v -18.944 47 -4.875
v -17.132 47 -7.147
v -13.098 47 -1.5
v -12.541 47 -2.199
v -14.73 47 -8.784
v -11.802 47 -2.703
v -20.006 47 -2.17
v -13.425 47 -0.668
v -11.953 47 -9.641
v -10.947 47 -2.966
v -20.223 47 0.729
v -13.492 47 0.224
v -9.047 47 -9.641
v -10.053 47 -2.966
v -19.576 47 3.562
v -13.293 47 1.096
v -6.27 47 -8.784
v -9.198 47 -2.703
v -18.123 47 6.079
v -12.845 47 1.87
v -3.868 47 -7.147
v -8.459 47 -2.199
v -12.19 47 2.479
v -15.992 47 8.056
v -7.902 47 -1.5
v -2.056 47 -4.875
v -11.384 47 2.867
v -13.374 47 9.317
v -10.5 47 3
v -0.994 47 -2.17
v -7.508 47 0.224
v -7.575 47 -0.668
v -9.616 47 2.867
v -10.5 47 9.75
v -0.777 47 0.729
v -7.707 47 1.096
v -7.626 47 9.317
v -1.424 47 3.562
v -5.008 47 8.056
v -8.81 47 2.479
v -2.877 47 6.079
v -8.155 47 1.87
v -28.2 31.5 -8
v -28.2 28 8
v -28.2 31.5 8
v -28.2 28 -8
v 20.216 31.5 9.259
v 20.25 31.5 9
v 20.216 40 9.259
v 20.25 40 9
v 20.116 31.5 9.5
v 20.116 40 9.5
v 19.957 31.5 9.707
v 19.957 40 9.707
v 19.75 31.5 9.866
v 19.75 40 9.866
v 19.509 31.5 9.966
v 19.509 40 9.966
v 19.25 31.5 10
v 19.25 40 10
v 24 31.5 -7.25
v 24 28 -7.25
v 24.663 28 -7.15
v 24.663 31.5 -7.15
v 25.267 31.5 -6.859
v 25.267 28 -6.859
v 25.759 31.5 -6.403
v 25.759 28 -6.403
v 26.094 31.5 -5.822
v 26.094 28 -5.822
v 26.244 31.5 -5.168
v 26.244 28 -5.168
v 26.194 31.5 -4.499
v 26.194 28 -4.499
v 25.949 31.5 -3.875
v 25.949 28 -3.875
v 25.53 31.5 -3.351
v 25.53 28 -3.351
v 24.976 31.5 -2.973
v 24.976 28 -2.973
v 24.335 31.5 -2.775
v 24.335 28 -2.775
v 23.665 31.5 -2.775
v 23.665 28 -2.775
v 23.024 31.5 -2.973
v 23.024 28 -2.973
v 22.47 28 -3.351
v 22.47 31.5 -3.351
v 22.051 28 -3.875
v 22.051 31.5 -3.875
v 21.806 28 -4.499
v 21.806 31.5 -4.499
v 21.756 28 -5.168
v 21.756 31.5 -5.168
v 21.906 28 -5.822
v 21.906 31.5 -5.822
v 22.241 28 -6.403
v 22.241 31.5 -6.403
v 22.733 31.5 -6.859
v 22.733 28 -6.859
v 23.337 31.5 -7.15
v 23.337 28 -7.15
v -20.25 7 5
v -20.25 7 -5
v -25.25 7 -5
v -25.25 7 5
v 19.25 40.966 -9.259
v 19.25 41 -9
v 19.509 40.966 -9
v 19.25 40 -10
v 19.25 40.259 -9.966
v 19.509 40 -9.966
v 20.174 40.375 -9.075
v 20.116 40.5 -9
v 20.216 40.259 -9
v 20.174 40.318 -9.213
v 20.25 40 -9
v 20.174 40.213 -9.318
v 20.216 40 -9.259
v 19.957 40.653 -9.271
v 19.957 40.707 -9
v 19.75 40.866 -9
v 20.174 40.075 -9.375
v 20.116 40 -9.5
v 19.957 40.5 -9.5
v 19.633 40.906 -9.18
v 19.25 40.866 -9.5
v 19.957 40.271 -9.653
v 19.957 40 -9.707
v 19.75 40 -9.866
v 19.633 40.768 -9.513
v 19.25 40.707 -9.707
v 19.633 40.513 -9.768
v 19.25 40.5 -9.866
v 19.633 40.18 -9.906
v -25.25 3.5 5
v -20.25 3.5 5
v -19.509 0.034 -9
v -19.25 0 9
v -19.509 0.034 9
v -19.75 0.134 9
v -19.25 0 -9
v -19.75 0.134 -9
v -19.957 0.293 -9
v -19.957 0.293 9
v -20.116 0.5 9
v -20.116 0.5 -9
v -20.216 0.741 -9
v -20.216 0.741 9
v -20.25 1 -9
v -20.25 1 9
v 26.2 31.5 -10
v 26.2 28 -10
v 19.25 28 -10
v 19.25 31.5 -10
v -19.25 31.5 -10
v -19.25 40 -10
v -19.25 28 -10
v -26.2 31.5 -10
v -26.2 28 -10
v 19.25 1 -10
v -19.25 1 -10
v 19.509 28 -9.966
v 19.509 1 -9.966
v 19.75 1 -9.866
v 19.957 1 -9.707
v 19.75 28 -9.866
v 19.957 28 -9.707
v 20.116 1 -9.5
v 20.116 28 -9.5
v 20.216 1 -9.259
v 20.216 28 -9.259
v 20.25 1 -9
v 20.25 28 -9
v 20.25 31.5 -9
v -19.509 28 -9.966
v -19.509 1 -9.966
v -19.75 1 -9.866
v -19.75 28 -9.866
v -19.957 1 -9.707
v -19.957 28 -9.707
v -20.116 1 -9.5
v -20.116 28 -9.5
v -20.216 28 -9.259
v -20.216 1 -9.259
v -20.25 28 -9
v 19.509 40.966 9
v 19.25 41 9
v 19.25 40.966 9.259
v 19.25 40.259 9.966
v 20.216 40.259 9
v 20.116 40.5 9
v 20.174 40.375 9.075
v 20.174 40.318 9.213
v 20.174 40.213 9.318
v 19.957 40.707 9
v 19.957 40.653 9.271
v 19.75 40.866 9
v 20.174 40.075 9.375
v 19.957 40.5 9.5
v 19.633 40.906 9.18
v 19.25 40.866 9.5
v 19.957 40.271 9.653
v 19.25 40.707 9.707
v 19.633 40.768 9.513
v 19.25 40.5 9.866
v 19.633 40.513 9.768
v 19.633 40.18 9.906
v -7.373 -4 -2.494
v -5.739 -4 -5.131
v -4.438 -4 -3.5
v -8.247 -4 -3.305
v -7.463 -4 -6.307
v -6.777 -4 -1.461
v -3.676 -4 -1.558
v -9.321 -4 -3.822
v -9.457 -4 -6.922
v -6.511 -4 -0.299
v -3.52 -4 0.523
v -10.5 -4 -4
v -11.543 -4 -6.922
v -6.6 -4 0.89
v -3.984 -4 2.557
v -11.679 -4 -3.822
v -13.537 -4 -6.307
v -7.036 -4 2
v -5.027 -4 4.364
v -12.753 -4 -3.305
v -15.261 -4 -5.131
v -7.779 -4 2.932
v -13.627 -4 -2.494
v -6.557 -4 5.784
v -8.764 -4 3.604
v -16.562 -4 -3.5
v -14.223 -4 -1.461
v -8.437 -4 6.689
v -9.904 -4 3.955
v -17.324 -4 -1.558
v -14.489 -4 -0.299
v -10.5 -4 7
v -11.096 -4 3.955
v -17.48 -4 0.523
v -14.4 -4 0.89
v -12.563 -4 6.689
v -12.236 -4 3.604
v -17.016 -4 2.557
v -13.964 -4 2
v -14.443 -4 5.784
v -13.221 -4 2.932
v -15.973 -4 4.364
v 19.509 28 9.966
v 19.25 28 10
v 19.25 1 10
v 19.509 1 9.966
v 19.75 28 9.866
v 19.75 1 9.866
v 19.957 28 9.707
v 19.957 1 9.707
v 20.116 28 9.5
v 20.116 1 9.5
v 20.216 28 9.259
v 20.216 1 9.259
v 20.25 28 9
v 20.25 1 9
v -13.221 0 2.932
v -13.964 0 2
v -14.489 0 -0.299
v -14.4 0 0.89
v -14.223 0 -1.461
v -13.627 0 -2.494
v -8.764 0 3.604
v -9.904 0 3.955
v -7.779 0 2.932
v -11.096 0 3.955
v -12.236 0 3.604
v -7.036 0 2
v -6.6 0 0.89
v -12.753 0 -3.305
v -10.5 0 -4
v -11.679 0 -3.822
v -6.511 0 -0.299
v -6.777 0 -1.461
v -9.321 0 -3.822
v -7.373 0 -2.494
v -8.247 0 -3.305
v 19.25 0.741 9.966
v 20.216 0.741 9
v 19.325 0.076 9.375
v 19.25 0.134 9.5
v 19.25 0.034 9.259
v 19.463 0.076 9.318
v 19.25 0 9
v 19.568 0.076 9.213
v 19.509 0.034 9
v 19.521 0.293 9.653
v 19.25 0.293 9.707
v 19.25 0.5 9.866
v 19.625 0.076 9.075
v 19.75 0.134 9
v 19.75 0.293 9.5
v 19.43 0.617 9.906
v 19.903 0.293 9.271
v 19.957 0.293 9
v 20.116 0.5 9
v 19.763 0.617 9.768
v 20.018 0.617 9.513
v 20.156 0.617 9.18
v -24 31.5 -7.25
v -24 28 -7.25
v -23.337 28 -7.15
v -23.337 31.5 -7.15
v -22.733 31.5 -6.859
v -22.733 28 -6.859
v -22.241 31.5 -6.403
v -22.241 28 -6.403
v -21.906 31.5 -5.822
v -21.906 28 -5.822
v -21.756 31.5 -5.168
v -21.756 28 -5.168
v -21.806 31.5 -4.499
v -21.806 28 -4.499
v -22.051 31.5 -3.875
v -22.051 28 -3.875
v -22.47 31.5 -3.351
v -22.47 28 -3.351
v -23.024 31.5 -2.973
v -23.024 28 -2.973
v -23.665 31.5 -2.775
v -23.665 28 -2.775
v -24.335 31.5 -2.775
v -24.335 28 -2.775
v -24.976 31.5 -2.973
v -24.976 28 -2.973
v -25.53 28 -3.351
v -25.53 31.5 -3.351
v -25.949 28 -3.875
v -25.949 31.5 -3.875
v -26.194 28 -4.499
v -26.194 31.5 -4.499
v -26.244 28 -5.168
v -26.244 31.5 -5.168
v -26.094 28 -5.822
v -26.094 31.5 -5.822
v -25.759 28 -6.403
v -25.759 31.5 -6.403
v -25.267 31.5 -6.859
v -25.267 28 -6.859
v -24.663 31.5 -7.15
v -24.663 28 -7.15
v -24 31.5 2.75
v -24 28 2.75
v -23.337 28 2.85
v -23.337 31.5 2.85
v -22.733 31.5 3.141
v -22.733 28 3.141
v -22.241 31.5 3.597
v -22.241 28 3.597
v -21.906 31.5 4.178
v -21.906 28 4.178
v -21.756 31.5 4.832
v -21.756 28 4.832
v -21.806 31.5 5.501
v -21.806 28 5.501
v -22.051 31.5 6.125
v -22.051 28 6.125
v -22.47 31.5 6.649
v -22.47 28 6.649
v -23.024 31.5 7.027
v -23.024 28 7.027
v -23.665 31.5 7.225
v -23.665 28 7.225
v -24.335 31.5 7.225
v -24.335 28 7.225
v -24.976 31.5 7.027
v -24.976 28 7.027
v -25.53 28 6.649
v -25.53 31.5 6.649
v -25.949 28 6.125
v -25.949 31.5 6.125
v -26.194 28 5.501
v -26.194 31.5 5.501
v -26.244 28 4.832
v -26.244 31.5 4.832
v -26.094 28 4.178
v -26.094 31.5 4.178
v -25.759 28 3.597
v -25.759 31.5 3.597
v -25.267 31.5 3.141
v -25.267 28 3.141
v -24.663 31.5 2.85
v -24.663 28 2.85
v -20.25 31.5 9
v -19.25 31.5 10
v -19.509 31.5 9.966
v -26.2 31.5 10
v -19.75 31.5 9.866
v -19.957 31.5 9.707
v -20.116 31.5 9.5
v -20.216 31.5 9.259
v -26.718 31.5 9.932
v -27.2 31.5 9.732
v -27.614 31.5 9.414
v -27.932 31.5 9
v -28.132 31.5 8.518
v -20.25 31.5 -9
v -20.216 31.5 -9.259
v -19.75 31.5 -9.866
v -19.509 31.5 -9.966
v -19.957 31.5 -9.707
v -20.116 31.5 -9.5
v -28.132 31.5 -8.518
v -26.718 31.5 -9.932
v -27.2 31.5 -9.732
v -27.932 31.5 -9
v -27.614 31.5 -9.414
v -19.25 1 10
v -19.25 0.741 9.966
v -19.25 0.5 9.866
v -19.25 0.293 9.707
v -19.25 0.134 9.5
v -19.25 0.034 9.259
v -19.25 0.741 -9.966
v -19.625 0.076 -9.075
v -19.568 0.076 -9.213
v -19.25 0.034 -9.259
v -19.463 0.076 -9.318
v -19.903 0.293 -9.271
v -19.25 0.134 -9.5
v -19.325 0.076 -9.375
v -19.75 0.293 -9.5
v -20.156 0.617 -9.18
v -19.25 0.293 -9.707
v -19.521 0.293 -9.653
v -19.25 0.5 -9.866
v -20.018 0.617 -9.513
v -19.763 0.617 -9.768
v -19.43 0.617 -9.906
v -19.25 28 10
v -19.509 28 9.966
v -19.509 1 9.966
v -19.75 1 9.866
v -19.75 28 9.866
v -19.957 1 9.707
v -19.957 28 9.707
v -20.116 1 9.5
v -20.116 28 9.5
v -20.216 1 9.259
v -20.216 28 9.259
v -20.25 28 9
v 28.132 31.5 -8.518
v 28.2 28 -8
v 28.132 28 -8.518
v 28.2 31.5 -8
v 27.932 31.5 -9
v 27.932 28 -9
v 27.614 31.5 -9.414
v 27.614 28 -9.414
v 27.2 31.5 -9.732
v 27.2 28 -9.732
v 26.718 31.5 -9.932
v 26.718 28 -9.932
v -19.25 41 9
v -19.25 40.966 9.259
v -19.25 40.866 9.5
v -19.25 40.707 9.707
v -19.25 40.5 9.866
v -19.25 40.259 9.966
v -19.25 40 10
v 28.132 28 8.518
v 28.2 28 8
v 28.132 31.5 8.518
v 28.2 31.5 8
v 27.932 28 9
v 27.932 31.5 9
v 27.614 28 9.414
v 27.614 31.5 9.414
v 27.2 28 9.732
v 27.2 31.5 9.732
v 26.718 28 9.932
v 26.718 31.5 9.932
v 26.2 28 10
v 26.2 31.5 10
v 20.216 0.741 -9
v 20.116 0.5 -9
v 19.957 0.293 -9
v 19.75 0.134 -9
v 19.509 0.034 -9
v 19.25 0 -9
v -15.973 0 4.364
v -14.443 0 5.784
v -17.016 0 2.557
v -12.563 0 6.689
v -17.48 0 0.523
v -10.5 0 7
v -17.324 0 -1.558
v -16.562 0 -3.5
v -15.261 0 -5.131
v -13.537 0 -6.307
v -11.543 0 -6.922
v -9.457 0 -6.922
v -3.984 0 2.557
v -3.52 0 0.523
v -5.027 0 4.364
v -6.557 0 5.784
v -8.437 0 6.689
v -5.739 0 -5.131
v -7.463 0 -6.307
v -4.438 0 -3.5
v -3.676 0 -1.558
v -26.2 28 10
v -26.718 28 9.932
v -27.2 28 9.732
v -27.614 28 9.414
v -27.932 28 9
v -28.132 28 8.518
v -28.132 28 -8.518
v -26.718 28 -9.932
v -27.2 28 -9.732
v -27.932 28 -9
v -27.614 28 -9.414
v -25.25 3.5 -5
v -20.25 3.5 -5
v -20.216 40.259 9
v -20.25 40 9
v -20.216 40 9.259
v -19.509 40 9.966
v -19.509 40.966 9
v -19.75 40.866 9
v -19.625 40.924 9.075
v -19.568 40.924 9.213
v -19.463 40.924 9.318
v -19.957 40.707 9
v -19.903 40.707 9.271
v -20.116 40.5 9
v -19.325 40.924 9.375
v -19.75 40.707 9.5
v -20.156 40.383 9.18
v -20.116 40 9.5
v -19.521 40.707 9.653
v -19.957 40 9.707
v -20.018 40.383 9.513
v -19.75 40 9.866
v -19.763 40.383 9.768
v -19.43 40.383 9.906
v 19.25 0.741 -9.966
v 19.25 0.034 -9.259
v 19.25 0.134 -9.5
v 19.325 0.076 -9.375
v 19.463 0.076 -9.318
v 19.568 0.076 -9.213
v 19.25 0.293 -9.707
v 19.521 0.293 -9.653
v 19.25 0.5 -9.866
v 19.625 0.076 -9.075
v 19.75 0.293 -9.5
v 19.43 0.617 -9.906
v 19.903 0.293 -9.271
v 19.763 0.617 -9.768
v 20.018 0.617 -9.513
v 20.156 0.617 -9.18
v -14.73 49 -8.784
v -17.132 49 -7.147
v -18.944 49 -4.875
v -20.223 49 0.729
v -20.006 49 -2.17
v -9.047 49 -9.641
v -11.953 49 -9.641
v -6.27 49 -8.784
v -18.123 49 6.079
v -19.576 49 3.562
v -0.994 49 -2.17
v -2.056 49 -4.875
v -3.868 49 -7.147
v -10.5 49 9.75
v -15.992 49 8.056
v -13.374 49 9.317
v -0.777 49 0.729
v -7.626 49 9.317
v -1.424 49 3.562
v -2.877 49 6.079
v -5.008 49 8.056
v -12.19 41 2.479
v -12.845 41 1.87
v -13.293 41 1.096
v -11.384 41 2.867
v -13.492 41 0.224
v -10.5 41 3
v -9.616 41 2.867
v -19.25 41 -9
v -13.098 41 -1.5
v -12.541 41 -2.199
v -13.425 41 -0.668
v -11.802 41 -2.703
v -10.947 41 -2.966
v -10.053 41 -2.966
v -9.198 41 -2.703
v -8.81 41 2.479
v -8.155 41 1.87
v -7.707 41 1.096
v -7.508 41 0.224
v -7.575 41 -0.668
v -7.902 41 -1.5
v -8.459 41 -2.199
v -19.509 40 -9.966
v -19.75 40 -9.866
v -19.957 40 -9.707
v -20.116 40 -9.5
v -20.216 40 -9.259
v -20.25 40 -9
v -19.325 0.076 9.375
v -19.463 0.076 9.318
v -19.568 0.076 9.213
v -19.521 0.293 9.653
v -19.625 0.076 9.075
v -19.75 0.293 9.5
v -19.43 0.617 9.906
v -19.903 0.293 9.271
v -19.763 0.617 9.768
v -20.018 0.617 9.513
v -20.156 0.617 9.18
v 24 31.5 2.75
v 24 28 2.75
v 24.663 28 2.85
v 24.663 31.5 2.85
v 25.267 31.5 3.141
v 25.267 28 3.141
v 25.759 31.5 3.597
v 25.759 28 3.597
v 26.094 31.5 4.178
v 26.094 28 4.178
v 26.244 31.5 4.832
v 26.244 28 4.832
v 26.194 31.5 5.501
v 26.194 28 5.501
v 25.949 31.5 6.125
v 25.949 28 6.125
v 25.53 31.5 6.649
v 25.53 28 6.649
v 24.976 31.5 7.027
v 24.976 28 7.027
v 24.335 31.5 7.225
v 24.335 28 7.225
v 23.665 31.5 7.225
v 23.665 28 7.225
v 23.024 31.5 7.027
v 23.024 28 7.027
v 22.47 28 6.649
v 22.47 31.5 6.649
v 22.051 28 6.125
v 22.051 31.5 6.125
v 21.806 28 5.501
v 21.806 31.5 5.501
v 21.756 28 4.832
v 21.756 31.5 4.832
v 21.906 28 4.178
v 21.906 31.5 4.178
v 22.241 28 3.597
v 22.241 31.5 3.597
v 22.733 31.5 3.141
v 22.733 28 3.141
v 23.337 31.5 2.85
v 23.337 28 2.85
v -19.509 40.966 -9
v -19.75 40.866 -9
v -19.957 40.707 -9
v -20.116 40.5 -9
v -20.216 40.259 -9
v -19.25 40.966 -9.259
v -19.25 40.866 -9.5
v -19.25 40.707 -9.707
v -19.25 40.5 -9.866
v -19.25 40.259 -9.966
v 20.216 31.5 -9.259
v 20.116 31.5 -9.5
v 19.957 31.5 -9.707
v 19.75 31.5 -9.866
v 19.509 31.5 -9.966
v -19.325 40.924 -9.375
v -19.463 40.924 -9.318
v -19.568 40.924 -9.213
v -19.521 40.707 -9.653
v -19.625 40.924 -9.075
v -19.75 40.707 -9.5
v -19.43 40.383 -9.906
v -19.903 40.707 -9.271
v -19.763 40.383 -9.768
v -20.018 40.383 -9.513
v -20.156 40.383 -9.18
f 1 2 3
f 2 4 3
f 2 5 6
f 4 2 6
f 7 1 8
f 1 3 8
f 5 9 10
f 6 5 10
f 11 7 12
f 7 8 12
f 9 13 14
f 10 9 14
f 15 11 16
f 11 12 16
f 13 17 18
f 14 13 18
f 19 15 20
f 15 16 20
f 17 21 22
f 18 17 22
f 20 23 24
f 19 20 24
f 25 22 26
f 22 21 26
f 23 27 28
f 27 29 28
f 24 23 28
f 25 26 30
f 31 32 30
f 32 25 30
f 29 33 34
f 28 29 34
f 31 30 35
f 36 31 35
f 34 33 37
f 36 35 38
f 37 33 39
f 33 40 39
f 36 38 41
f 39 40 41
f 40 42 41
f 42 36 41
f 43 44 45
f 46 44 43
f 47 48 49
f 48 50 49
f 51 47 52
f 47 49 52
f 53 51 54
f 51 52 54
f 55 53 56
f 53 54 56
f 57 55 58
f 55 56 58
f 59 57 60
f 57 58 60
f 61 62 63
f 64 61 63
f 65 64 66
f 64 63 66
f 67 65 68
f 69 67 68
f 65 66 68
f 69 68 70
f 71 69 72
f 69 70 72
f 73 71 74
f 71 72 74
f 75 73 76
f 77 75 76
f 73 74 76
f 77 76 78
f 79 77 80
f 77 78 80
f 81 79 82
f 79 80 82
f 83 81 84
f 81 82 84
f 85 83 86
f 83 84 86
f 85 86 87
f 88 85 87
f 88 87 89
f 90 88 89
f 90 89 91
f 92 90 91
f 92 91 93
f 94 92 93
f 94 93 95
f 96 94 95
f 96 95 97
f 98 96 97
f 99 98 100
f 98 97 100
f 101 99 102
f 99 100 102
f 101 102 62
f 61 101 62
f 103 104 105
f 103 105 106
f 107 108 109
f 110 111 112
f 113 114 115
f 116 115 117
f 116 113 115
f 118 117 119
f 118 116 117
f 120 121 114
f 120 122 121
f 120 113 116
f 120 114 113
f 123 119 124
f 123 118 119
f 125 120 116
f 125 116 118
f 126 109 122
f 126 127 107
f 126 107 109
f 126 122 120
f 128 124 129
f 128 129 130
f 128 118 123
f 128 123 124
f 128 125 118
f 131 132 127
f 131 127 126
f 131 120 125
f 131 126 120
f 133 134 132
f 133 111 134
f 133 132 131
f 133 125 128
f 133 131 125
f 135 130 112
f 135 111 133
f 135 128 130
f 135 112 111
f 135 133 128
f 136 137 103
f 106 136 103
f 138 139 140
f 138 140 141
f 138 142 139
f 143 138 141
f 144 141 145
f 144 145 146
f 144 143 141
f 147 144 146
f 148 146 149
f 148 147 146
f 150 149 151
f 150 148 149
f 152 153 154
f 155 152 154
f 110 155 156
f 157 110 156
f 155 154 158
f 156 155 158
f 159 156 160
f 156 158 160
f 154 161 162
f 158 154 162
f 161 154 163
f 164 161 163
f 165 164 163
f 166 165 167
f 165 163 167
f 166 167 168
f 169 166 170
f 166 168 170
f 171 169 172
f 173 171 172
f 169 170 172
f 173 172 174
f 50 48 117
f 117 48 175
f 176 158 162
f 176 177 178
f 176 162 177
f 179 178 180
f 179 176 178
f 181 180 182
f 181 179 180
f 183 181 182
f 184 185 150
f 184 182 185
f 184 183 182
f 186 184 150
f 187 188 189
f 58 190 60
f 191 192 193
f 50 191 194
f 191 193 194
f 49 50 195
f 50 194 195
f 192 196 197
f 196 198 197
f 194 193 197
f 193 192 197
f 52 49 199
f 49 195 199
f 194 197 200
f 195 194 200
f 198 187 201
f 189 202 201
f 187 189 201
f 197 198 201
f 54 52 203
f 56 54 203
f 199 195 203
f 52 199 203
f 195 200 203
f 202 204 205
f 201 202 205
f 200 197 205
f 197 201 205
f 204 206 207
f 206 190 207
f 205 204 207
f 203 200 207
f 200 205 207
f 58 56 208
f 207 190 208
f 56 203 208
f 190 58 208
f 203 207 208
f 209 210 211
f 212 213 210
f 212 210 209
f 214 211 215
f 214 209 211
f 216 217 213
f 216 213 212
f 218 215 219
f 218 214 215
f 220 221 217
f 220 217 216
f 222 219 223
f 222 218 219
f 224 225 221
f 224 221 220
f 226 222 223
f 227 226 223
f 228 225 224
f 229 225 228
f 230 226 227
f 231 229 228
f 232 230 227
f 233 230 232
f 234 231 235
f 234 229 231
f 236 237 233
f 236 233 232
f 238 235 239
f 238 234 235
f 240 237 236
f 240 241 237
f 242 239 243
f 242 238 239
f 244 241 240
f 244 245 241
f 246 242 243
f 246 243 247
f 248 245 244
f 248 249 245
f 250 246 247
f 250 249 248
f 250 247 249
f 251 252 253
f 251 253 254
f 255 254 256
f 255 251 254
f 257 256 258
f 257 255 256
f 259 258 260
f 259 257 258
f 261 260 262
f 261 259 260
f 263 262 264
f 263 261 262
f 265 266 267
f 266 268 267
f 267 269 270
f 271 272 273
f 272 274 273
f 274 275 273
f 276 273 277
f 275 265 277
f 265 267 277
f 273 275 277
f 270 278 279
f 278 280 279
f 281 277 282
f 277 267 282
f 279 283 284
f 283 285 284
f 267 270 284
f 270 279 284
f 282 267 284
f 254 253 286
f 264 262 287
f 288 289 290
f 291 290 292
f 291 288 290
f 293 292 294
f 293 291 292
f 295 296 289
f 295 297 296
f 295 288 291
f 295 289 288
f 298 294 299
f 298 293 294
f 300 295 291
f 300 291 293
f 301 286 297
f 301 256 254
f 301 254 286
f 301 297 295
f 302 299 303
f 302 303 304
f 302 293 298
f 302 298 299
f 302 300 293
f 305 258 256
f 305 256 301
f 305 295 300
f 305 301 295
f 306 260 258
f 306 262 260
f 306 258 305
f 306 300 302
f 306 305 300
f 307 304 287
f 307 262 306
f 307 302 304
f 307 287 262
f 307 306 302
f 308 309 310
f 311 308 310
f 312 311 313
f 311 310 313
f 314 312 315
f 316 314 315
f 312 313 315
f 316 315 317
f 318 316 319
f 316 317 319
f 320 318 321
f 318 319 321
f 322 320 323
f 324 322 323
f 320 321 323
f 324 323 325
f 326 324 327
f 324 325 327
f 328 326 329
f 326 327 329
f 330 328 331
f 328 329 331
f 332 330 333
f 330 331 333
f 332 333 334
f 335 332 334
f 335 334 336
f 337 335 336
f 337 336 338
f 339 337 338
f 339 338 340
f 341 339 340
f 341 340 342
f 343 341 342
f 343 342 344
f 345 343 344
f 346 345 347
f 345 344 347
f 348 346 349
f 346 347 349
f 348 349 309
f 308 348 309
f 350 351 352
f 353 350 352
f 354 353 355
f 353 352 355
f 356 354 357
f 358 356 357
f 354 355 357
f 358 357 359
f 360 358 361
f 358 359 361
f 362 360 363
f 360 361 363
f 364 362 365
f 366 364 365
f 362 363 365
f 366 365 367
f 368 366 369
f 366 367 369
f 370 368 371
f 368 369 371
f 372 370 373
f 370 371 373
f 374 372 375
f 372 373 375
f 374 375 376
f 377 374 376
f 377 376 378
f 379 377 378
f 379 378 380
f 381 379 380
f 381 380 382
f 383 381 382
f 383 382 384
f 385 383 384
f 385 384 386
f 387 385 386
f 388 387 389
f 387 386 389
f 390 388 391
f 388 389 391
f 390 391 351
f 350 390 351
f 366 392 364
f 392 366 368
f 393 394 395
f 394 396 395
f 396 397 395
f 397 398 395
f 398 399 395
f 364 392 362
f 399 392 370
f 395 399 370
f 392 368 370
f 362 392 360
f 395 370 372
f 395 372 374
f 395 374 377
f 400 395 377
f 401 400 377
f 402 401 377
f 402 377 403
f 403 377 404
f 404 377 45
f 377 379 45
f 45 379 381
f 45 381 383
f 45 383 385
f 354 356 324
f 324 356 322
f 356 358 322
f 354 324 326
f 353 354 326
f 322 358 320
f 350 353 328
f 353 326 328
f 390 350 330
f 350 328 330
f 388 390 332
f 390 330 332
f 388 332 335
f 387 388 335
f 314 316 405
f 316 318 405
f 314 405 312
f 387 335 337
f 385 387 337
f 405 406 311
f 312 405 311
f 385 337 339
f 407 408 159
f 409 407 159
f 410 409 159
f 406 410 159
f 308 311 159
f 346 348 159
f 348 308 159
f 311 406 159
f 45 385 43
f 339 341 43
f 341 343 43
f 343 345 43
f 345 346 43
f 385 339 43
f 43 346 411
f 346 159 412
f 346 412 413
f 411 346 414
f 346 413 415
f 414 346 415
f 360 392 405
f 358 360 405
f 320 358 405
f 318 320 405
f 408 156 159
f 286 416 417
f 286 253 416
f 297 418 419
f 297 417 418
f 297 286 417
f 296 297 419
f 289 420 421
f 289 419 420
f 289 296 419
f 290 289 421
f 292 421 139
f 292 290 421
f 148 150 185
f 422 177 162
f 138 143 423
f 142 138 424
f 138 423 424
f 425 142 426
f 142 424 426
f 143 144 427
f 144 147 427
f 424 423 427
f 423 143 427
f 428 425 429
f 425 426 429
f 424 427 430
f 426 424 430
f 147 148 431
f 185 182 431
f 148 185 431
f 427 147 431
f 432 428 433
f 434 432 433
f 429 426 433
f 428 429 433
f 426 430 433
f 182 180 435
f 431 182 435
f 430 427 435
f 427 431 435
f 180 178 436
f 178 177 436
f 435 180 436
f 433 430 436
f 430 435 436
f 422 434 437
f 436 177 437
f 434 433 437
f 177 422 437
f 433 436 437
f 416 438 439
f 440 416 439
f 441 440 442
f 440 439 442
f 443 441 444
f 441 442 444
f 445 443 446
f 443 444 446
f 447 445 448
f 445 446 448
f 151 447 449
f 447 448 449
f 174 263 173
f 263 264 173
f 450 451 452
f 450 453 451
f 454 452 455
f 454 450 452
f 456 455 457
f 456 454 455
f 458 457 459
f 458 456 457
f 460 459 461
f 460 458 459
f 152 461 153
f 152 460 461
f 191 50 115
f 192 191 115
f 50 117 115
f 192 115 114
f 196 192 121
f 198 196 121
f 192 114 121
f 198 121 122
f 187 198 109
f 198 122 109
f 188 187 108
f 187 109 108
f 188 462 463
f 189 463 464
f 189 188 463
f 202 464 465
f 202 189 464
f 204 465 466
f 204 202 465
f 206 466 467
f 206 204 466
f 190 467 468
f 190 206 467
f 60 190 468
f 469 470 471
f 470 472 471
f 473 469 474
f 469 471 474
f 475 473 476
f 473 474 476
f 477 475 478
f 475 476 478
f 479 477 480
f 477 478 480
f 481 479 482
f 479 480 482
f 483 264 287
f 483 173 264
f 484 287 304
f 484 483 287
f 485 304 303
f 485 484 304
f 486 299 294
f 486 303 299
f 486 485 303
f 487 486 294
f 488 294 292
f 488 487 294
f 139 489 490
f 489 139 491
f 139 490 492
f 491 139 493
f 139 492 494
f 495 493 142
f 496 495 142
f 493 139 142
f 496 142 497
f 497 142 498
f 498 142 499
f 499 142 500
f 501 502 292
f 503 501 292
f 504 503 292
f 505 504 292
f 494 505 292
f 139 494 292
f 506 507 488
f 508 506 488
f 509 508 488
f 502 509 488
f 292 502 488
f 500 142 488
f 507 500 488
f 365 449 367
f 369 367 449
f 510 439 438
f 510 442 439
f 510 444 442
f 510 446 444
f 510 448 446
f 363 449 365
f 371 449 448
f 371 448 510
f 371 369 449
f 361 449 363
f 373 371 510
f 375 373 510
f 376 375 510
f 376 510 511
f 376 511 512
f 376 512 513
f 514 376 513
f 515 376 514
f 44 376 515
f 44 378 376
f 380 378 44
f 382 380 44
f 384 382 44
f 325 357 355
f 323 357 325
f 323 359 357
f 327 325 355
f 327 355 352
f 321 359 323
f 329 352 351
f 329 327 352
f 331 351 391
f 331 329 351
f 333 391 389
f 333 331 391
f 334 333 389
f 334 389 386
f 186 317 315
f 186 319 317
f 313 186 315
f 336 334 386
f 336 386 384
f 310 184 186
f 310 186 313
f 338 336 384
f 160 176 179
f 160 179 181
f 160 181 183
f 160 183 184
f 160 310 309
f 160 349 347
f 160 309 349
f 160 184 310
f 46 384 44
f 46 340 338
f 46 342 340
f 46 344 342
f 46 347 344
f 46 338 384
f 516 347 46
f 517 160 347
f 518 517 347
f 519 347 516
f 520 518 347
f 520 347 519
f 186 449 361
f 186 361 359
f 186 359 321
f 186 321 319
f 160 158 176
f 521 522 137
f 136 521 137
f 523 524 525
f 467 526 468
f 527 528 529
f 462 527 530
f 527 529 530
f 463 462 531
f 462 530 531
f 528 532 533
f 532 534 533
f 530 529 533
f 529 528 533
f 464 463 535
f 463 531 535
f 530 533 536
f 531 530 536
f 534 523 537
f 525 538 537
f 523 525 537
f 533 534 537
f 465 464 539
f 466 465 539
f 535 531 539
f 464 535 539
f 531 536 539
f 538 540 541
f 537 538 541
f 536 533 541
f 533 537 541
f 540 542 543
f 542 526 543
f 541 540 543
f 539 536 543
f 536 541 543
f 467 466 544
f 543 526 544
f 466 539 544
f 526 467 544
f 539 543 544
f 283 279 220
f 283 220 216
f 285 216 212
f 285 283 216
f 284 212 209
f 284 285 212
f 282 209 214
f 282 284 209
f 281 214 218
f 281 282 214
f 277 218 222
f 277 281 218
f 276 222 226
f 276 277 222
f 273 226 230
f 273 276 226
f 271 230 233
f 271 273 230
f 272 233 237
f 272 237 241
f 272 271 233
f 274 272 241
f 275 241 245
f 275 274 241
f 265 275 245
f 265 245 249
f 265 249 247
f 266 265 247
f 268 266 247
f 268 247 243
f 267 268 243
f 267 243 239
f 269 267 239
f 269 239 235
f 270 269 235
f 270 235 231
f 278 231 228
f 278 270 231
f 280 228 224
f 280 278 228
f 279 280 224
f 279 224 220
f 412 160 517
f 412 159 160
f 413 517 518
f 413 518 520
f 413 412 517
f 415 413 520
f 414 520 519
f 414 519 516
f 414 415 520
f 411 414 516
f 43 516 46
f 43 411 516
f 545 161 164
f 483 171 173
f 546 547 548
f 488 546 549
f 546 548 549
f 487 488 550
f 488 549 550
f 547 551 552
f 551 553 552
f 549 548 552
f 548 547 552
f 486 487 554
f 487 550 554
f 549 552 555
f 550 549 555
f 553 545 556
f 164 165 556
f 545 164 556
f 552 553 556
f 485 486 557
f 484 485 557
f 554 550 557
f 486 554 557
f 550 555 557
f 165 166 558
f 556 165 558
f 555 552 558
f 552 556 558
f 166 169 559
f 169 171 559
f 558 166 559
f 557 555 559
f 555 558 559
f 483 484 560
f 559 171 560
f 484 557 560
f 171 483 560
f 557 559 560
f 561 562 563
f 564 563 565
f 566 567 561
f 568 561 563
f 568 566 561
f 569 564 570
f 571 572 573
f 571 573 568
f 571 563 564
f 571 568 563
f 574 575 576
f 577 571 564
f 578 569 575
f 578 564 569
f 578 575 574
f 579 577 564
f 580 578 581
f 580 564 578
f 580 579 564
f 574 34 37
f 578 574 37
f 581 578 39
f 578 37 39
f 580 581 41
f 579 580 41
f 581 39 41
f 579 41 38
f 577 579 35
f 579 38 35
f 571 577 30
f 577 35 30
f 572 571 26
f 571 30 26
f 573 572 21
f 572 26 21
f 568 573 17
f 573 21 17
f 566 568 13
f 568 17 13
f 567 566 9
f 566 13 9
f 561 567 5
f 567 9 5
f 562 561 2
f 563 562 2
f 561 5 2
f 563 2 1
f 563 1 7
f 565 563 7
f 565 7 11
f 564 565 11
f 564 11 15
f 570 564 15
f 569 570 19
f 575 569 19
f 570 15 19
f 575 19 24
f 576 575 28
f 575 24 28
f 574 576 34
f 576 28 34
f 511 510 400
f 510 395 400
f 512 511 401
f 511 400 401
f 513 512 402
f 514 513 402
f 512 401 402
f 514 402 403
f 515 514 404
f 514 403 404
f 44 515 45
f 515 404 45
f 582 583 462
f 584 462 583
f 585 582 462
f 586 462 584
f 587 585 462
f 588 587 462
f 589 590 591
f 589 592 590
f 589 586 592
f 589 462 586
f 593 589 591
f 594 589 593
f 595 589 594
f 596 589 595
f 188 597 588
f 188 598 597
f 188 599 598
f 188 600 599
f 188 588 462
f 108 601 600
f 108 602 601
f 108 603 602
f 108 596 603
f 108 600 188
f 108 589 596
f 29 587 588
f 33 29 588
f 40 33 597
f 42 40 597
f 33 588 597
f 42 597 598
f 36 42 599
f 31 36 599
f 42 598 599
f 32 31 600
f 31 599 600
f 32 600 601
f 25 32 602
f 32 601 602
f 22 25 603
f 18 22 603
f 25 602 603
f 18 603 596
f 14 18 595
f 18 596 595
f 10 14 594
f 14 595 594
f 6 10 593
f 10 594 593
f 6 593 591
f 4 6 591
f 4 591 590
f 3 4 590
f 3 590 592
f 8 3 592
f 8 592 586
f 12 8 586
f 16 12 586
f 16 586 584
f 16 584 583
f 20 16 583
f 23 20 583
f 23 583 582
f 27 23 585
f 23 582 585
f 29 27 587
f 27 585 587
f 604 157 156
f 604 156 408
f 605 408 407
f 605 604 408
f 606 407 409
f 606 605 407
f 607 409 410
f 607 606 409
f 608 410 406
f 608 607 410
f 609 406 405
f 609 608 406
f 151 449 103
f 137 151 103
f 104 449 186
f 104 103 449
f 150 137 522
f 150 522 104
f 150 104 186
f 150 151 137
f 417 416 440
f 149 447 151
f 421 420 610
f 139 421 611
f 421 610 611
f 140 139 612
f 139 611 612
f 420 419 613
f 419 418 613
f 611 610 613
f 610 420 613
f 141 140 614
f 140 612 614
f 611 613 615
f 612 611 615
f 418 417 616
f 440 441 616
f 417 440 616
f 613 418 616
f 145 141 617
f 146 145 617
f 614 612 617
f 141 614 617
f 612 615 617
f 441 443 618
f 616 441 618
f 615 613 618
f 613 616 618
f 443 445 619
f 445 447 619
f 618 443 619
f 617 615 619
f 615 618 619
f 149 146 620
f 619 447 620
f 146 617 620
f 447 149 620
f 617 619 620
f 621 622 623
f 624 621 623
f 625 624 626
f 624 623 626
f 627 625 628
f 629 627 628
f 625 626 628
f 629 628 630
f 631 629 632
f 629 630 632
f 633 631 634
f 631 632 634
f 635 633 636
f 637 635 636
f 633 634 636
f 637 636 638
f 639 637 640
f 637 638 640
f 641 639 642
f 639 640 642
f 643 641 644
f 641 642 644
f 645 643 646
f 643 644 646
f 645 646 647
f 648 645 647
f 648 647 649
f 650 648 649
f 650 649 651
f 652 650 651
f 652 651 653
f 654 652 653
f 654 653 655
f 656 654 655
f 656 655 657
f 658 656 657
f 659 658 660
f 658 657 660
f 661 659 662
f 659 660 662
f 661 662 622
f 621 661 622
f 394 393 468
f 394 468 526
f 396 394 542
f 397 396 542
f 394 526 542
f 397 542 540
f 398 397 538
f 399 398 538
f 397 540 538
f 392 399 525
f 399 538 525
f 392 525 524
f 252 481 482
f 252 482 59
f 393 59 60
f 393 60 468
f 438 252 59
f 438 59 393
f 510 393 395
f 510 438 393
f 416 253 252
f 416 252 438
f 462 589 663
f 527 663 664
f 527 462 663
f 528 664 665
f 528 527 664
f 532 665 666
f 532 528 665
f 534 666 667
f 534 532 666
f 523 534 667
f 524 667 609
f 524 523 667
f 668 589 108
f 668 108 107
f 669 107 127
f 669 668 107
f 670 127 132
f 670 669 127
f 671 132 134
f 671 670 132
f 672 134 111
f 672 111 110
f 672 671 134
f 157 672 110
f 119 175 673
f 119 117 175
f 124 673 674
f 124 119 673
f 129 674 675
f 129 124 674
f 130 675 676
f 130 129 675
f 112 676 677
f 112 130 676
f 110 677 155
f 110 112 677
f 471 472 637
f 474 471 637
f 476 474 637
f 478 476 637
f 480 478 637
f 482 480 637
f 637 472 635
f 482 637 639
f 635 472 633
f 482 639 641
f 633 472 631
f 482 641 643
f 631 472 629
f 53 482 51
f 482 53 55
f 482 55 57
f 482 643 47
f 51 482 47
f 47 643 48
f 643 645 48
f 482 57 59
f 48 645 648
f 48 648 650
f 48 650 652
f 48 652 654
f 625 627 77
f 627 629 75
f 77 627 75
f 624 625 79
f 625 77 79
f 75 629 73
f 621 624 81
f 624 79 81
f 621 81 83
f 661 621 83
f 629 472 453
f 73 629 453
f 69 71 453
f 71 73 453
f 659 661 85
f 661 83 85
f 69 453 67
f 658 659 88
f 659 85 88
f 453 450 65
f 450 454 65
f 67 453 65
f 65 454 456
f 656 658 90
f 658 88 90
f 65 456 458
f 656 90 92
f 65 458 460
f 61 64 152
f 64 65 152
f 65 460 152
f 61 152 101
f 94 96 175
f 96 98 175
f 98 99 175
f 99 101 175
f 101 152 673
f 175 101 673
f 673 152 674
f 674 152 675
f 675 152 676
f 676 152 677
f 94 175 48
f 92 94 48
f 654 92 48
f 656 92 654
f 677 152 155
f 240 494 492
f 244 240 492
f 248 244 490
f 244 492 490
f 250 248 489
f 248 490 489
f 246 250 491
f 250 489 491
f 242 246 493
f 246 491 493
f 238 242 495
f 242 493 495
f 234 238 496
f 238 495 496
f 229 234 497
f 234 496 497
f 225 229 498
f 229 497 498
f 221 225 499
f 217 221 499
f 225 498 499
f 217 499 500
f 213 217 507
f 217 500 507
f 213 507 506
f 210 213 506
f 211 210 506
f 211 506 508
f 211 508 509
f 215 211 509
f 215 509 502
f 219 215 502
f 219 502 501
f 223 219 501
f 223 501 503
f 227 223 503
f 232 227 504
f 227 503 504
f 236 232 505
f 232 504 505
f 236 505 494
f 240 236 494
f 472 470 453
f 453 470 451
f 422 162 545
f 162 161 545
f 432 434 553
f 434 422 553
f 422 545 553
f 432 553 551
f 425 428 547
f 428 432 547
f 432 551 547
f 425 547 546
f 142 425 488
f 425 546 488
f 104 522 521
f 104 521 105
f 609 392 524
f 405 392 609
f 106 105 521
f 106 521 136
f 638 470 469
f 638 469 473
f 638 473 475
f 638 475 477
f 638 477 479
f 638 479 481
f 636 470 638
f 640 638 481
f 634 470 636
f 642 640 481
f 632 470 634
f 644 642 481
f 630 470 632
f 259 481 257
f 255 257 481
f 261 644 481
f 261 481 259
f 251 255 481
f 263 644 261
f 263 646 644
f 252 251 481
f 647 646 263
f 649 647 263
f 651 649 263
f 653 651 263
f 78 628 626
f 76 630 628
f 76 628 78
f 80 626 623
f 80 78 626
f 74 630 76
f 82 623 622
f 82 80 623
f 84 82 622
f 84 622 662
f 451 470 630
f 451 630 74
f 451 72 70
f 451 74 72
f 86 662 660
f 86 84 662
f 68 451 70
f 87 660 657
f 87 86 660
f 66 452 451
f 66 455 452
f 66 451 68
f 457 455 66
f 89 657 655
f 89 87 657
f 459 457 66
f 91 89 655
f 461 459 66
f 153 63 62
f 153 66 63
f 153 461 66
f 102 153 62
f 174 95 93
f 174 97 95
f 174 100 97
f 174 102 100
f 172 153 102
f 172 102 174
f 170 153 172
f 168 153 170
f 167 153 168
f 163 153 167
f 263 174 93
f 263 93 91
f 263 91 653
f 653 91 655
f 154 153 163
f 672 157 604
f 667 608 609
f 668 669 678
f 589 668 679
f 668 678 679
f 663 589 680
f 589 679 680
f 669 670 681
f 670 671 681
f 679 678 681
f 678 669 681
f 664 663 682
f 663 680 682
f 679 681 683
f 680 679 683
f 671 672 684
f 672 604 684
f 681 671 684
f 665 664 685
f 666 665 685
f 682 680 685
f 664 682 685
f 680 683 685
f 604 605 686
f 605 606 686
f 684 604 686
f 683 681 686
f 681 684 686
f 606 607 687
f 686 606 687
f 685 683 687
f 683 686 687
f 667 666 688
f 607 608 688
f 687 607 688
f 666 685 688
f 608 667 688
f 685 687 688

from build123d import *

# Parameters (mm, degrees)
SKETCH1_W           = 40.5
SKETCH1_H           = 20
BOSS_EXTRUDE1_DEPTH = 41
SKETCH2_W           = 56.4
SKETCH2_H           = 20
SKETCH2_R           = 2.25
BOSS_EXTRUDE2_DEPTH = 3.5
SKETCH3_R           = 3
BOSS_EXTRUDE3_DEPTH = 6
SKETCH4_W           = 10
SKETCH4_H           = 3.5
BOSS_EXTRUDE4_DEPTH = 5
FILLET1_R           = 2
FILLET2_R           = 1
FILLET3_R           = 1
SKETCH5_R           = 9.75
BOSS_EXTRUDE5_DEPTH = 2
SKETCH6_R           = 7
SKETCH6_R_2         = 4
BOSS_EXTRUDE6_DEPTH = 4


with BuildPart() as part:
    # Sketch1 → Boss-Extrude1 (new body)
    with BuildSketch(Plane(origin=(0, 0, 0), x_dir=(1, 0, 0), z_dir=(0, 1, 0))):
        Rectangle(SKETCH1_W, SKETCH1_H)
    extrude(amount=BOSS_EXTRUDE1_DEPTH)

    # Sketch2 → Boss-Extrude2 (add)
    with BuildSketch(Plane(origin=(0, 28, 0), x_dir=(-1, 0, 0), z_dir=(0, -1, 0))):
        Rectangle(SKETCH2_W, SKETCH2_H)
        with Locations(Location((-24, 5, 0), (0, 0, 90))):
            Circle(SKETCH2_R, mode=Mode.SUBTRACT)
        with Locations(Location((24, 5, 0), (0, 0, 90))):
            Circle(SKETCH2_R, mode=Mode.SUBTRACT)
        with Locations(Location((24, -5, 0), (0, 0, 90))):
            Circle(SKETCH2_R, mode=Mode.SUBTRACT)
        with Locations(Location((-24, -5, 0), (0, 0, 90))):
            Circle(SKETCH2_R, mode=Mode.SUBTRACT)
    extrude(amount=-BOSS_EXTRUDE2_DEPTH)

    # Sketch3 → Boss-Extrude3 (add)
    with BuildSketch(Plane(origin=(0, 41, 0), x_dir=(1, 0, 0), z_dir=(0, 1, 0))):
        with Locations(Location((-10.5, 0, 0), (0, 0, 270))):
            Circle(SKETCH3_R)
    extrude(amount=BOSS_EXTRUDE3_DEPTH)

    # Sketch4 → Boss-Extrude4 (add)
    with BuildSketch(Plane.ZY.offset(20.25)):
        with Locations((0, 5.25)):
            Rectangle(SKETCH4_W, SKETCH4_H)
    extrude(amount=BOSS_EXTRUDE4_DEPTH)

    # Fillet1
    fillet1_edges = [part.edges().sort_by_distance(p)[0] for p in [
        (28.2, 29.75, -10),
        (-28.2, 29.75, 10),
        (28.2, 29.75, 10),
        (-28.2, 29.75, -10),
    ]]
    fillet(fillet1_edges, radius=FILLET1_R)

    # Fillet2
    fillet2_edges = [part.edges().sort_by_distance(p)[0] for p in [
        (20.25, 14, 10),
        (-20.25, 14, 10),
        (-20.25, 14, -10),
        (20.25, 14, -10),
        (0, 0, 10),
        (-20.25, 0, 0),
        (0, 0, -10),
        (20.25, 0, 0),
        (-20.25, 36.25, 10),
        (-20.25, 36.25, -10),
    ]]
    fillet(fillet2_edges, radius=FILLET2_R)

    # Fillet3
    fillet3_edges = [part.edges().sort_by_distance(p)[0] for p in [
        (0.5, 41, 10),
        (-20.25, 41, 0),
        (-19.957106781, 41, 9.707106781),
        (-19.957106781, 41, -9.707106781),
        (20.25, 41, 0),
        (20.25, 36.25, 10),
        (20.25, 36.25, -10),
        (0.5, 41, -10),
    ]]
    fillet(fillet3_edges, radius=FILLET3_R)

    # Sketch5 → Boss-Extrude5 (add)
    with BuildSketch(Plane(origin=(0, 47, 0), x_dir=(1, 0, 0), z_dir=(0, 1, 0))):
        with Locations(Location((-10.5, 0, 0), (0, 0, 270))):
            Circle(SKETCH5_R)
    extrude(amount=BOSS_EXTRUDE5_DEPTH)

    # Sketch6 → Boss-Extrude6 (add)
    with BuildSketch(Plane.XZ):
        with Locations(Location((-10.5, 0, 0), (0, 0, 90))):
            Circle(SKETCH6_R)
        with Locations(Location((-10.5, 0, 0), (0, 0, 270))):
            Circle(SKETCH6_R_2, mode=Mode.SUBTRACT)
    extrude(amount=BOSS_EXTRUDE6_DEPTH)


solid = part.part
